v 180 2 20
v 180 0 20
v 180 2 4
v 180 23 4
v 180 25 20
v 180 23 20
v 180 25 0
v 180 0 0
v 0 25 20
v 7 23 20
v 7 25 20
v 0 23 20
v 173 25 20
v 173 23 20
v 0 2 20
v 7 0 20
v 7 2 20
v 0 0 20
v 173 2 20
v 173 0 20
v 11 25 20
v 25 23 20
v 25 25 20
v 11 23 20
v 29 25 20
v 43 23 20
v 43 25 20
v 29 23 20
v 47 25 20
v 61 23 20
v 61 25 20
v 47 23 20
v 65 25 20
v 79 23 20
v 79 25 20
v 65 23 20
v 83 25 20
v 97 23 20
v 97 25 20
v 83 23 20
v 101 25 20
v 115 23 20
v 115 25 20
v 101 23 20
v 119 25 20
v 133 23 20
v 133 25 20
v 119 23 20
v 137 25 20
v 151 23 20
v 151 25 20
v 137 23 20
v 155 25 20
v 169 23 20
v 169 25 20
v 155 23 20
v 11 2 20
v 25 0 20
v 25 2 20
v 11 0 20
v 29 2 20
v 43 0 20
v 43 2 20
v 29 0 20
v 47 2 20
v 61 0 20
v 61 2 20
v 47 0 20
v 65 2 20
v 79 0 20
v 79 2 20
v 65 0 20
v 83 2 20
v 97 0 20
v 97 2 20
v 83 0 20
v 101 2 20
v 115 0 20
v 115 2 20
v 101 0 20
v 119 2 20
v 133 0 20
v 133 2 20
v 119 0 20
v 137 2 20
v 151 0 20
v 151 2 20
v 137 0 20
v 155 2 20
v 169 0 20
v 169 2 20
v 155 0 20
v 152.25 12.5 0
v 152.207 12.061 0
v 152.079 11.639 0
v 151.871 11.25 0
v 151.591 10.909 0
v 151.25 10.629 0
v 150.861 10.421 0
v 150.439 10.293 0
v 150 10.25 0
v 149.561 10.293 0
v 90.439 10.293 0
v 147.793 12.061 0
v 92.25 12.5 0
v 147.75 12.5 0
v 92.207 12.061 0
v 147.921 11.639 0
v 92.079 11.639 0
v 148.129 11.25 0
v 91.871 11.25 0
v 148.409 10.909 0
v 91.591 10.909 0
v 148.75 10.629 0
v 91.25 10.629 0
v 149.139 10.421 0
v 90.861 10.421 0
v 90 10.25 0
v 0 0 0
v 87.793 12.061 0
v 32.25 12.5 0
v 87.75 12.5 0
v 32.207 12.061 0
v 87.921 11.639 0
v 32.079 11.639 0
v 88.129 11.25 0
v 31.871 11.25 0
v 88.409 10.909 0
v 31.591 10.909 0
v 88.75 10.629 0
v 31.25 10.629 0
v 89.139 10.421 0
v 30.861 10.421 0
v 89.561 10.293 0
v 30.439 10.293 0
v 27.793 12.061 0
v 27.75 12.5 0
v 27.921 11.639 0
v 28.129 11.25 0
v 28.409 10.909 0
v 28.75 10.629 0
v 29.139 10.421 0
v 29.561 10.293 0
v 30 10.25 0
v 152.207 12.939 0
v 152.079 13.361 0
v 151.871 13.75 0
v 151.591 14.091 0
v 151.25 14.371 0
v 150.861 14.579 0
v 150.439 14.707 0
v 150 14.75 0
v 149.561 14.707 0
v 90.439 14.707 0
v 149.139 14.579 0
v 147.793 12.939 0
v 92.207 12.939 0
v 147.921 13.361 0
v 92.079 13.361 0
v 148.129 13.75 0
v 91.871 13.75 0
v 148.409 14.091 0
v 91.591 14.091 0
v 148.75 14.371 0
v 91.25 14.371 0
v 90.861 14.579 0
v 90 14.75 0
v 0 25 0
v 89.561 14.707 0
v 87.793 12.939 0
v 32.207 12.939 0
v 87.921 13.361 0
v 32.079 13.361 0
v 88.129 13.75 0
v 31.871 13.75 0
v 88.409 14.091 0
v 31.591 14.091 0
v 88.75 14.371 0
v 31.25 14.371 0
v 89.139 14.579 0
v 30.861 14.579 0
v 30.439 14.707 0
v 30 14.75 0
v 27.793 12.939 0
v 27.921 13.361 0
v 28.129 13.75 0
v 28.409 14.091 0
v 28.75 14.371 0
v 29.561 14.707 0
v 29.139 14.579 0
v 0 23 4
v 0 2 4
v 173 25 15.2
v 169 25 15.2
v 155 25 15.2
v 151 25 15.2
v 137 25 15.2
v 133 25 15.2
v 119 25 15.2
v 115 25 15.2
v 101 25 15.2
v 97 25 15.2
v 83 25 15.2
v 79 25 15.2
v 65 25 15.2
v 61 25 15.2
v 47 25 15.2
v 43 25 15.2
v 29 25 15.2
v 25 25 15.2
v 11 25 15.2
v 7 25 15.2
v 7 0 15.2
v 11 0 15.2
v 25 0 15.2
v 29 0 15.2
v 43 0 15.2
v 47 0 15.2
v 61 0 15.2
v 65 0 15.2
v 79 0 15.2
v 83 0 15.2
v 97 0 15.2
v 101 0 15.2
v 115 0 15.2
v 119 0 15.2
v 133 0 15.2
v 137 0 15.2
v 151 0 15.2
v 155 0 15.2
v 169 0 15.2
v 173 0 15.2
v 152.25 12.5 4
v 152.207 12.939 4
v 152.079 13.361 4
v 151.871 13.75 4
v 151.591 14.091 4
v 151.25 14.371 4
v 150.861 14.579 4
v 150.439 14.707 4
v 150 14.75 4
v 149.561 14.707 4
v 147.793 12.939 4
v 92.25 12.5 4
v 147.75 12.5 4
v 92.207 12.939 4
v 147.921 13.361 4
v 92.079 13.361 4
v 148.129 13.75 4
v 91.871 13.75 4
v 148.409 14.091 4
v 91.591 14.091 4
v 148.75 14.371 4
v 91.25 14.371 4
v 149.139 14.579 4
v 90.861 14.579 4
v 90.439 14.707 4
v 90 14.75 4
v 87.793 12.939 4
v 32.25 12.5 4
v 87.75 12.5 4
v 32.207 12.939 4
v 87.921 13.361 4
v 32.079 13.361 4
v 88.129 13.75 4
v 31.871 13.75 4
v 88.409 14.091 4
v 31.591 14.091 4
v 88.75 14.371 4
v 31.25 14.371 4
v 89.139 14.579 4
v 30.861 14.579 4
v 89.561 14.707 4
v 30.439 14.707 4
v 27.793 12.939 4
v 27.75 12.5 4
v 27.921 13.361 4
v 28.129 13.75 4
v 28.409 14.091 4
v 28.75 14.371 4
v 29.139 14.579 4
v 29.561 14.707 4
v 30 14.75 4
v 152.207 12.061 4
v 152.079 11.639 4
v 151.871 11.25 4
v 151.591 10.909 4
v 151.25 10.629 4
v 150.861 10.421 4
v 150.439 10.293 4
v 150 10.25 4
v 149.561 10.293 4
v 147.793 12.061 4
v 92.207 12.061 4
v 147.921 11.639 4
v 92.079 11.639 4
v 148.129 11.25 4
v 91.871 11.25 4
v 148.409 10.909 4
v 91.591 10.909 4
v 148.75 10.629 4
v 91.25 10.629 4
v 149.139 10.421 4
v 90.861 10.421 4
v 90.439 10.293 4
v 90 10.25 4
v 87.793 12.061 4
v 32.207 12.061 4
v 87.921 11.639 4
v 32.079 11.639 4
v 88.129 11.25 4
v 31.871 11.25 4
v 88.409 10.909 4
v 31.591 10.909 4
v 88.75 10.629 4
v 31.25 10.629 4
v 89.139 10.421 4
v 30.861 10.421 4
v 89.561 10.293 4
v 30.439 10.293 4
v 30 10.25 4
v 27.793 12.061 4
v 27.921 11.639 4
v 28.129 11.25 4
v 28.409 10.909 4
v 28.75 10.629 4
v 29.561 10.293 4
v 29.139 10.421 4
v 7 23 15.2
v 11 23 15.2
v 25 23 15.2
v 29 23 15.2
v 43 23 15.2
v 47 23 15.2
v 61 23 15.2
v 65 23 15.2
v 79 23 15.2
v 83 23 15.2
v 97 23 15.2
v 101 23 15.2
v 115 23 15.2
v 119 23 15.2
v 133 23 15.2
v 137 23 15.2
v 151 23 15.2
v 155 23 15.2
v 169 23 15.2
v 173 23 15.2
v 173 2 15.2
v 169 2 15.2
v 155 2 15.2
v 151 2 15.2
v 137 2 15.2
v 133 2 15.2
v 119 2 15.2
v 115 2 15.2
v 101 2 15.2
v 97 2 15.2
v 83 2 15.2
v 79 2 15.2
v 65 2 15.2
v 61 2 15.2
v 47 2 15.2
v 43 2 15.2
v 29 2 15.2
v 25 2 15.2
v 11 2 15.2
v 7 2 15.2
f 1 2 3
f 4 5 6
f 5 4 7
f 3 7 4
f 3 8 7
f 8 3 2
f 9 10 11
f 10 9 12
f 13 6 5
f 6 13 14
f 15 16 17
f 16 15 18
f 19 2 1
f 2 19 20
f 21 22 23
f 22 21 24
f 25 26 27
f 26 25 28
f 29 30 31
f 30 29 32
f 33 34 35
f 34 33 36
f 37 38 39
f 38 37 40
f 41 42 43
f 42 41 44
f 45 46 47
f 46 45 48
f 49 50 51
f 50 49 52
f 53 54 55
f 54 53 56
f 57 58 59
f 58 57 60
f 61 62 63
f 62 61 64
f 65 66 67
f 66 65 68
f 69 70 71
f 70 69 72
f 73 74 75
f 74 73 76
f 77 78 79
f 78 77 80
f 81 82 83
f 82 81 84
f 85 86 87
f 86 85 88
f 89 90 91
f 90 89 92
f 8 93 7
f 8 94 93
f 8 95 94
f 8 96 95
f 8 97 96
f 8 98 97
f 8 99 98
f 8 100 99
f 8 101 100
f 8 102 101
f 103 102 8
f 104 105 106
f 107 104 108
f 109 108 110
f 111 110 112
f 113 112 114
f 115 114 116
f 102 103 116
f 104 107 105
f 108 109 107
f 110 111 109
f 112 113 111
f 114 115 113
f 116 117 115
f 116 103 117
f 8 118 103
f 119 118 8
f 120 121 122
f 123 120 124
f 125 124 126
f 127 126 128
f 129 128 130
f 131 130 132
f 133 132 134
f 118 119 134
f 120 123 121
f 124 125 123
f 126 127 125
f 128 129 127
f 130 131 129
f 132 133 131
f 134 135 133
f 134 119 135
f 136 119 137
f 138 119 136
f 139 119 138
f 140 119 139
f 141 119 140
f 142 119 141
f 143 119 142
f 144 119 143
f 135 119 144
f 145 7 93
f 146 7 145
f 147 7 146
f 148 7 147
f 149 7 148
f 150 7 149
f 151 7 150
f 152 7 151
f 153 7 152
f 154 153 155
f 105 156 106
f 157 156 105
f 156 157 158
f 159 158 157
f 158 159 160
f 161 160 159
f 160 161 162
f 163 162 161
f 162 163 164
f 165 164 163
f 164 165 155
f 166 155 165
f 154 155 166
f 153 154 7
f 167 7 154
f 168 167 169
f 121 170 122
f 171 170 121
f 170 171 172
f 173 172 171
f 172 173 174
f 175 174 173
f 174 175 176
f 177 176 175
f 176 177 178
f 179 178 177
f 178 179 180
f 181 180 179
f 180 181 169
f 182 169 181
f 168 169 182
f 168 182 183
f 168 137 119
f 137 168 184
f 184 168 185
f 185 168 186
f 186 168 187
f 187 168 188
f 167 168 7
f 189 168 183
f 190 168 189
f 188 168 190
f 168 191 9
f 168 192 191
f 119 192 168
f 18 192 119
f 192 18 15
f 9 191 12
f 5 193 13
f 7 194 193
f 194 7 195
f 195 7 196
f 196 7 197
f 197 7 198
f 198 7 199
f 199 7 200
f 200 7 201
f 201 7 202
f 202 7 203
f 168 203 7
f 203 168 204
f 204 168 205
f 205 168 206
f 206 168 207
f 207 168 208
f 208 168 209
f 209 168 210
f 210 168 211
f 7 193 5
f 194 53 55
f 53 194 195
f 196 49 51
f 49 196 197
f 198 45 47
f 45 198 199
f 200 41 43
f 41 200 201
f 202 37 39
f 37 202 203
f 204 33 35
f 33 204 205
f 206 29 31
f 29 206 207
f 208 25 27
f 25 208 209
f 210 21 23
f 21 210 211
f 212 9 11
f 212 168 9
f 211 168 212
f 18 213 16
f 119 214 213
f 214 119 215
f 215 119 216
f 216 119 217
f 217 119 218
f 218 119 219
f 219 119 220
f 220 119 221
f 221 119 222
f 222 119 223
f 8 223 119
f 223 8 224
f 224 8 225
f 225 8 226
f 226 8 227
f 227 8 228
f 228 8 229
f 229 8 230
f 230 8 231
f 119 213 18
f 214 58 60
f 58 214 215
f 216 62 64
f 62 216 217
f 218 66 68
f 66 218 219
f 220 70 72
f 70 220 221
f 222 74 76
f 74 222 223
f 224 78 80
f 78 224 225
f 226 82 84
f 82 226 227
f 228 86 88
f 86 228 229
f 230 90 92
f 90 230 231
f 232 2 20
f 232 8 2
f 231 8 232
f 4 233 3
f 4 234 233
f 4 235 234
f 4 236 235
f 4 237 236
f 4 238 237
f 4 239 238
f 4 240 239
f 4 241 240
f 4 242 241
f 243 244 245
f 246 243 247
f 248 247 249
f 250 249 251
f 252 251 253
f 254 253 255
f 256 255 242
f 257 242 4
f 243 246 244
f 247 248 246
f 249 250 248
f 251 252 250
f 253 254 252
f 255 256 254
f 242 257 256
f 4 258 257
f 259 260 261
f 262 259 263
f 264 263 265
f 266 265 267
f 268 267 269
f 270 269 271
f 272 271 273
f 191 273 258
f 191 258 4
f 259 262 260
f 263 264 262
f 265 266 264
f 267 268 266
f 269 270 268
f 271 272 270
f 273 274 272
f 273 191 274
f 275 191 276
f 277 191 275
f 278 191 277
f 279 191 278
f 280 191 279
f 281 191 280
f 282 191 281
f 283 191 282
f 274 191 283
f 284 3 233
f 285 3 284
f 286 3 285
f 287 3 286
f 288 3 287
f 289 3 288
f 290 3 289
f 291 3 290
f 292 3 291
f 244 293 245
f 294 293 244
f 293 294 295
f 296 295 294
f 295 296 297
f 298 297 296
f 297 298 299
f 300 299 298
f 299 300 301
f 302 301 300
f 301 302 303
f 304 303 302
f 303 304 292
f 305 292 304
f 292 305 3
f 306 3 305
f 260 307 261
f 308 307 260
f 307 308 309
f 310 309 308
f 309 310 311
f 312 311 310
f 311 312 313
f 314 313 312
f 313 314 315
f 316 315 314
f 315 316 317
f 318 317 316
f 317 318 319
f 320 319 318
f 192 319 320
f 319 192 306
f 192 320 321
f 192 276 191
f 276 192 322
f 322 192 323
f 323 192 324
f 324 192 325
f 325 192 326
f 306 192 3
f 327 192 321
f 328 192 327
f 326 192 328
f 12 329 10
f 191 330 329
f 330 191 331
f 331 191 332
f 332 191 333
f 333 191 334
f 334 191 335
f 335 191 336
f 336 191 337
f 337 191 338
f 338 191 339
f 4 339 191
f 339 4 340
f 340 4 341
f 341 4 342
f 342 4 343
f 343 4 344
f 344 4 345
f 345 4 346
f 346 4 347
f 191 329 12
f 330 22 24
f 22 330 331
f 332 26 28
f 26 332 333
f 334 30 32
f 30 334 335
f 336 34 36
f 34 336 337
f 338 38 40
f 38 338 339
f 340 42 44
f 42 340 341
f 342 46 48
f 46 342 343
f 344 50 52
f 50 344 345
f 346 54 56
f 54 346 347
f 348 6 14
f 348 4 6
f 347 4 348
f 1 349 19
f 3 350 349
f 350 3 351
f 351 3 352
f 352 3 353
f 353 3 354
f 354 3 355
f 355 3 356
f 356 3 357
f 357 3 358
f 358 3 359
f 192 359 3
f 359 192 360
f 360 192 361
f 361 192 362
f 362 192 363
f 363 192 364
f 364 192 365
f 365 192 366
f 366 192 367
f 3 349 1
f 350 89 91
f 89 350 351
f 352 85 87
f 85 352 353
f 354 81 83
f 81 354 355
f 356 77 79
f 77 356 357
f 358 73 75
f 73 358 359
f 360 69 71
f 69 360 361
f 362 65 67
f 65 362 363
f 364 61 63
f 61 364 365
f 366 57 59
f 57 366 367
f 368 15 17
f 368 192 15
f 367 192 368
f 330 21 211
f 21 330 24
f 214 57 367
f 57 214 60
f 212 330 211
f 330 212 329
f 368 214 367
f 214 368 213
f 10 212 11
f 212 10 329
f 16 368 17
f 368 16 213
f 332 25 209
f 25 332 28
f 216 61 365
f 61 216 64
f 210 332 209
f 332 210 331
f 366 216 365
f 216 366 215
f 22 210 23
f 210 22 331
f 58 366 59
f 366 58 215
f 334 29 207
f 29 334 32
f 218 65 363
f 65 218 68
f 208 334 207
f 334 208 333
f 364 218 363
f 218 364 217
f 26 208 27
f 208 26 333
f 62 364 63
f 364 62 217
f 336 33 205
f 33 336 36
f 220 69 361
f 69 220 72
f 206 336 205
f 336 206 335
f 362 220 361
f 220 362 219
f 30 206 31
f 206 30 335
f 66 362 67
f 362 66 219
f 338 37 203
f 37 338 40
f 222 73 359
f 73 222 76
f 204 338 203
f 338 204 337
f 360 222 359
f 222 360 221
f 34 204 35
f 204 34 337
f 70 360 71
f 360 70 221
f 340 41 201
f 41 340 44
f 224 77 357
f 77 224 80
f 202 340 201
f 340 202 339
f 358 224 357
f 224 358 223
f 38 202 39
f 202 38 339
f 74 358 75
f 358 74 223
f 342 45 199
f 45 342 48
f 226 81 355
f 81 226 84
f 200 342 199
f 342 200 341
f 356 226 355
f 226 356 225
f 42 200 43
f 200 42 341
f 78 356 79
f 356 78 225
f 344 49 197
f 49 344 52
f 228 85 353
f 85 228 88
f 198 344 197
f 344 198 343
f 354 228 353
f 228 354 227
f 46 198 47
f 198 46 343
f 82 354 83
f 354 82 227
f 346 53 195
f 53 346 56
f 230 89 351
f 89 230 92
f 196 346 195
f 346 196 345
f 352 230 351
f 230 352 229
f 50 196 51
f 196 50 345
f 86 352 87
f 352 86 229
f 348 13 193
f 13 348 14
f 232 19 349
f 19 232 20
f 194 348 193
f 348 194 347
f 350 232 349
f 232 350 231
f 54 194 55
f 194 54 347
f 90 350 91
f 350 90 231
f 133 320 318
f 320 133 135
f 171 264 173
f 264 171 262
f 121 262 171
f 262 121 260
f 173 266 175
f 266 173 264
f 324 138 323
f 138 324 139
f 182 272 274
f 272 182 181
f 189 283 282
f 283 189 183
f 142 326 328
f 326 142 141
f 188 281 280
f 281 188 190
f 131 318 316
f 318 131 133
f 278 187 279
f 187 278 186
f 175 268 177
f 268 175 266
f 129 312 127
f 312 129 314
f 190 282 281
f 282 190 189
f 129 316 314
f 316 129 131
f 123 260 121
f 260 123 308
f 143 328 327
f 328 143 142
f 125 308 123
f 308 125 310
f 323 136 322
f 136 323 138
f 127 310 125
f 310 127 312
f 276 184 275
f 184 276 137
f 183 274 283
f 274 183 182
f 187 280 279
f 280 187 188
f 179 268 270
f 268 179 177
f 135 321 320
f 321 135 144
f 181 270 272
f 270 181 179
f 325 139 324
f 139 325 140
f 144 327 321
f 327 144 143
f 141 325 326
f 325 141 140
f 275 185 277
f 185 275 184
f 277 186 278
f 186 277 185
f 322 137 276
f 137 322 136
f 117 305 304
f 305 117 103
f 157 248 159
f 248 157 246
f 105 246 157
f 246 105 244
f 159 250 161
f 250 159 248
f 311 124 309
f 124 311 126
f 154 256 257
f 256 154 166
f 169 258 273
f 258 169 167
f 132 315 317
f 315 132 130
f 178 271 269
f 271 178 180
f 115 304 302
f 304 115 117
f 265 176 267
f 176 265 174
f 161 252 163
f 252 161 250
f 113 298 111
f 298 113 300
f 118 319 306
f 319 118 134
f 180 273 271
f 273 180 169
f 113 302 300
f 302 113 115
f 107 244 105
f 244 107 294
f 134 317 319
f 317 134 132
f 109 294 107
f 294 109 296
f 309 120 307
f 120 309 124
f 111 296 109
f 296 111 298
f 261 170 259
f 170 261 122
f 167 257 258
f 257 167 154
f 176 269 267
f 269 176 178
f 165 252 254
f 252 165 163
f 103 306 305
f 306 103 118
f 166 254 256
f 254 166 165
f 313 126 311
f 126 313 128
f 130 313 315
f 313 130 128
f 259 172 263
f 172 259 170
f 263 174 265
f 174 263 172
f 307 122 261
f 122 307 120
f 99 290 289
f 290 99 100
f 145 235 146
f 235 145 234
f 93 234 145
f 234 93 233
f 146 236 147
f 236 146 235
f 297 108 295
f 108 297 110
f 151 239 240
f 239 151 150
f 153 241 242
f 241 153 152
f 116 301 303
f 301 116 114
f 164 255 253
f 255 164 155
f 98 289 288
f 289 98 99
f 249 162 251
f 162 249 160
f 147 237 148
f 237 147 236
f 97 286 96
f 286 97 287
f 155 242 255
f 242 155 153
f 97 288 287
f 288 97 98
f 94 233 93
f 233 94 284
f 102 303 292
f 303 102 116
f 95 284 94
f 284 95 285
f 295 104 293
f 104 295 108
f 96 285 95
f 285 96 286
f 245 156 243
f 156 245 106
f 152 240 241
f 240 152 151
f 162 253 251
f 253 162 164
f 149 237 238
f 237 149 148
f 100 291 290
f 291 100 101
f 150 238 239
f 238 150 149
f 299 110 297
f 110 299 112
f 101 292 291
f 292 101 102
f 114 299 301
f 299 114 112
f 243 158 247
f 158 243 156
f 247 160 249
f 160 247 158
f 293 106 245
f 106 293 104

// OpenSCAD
$fn = 32;

// ----------------------------------------------------------------------
// Cable duct: 180 x 25 x 20 mm, 10 fingers
// ----------------------------------------------------------------------

// --- parameters (mm) ---
duct_len = 180;           // duct length, X
duct_w = 25;              // duct width, Y
duct_h = 20;              // duct height, Z
wall_t = 2;               // side wall thickness
floor_t = 4;              // floor thickness
slot_w = 4;               // finger slot width
slot_h = 11.2;            // finger slot height
fingers = 10;             // number of finger slots per side
pitch = 18;               // finger pitch
hole_d = 4.5;             // floor mounting hole
hole_n = 3;               // mounting holes in the floor

module shell() {
  difference() {
    cube([duct_len, duct_w, duct_h]);
    /* open top channel */
    translate([-wall_t - 1, wall_t, floor_t])
      cube([duct_len + 2 * wall_t + 2, duct_w - 2 * wall_t, duct_h + 1]);
  }
}

difference() {
  union() {
    shell();
  }
  /* finger slots cut through both side walls */
  for (i = [0 : fingers - 1]) translate([pitch / 2 + i * pitch - slot_w / 2, -1, floor_t + slot_h]) cube([slot_w, duct_w + 2, duct_h]);
  for (i = [0 : hole_n - 1]) translate([(duct_len / hole_n) * (i + 0.5), duct_w / 2, -1]) cylinder(h = floor_t + 2, d = hole_d);
}
